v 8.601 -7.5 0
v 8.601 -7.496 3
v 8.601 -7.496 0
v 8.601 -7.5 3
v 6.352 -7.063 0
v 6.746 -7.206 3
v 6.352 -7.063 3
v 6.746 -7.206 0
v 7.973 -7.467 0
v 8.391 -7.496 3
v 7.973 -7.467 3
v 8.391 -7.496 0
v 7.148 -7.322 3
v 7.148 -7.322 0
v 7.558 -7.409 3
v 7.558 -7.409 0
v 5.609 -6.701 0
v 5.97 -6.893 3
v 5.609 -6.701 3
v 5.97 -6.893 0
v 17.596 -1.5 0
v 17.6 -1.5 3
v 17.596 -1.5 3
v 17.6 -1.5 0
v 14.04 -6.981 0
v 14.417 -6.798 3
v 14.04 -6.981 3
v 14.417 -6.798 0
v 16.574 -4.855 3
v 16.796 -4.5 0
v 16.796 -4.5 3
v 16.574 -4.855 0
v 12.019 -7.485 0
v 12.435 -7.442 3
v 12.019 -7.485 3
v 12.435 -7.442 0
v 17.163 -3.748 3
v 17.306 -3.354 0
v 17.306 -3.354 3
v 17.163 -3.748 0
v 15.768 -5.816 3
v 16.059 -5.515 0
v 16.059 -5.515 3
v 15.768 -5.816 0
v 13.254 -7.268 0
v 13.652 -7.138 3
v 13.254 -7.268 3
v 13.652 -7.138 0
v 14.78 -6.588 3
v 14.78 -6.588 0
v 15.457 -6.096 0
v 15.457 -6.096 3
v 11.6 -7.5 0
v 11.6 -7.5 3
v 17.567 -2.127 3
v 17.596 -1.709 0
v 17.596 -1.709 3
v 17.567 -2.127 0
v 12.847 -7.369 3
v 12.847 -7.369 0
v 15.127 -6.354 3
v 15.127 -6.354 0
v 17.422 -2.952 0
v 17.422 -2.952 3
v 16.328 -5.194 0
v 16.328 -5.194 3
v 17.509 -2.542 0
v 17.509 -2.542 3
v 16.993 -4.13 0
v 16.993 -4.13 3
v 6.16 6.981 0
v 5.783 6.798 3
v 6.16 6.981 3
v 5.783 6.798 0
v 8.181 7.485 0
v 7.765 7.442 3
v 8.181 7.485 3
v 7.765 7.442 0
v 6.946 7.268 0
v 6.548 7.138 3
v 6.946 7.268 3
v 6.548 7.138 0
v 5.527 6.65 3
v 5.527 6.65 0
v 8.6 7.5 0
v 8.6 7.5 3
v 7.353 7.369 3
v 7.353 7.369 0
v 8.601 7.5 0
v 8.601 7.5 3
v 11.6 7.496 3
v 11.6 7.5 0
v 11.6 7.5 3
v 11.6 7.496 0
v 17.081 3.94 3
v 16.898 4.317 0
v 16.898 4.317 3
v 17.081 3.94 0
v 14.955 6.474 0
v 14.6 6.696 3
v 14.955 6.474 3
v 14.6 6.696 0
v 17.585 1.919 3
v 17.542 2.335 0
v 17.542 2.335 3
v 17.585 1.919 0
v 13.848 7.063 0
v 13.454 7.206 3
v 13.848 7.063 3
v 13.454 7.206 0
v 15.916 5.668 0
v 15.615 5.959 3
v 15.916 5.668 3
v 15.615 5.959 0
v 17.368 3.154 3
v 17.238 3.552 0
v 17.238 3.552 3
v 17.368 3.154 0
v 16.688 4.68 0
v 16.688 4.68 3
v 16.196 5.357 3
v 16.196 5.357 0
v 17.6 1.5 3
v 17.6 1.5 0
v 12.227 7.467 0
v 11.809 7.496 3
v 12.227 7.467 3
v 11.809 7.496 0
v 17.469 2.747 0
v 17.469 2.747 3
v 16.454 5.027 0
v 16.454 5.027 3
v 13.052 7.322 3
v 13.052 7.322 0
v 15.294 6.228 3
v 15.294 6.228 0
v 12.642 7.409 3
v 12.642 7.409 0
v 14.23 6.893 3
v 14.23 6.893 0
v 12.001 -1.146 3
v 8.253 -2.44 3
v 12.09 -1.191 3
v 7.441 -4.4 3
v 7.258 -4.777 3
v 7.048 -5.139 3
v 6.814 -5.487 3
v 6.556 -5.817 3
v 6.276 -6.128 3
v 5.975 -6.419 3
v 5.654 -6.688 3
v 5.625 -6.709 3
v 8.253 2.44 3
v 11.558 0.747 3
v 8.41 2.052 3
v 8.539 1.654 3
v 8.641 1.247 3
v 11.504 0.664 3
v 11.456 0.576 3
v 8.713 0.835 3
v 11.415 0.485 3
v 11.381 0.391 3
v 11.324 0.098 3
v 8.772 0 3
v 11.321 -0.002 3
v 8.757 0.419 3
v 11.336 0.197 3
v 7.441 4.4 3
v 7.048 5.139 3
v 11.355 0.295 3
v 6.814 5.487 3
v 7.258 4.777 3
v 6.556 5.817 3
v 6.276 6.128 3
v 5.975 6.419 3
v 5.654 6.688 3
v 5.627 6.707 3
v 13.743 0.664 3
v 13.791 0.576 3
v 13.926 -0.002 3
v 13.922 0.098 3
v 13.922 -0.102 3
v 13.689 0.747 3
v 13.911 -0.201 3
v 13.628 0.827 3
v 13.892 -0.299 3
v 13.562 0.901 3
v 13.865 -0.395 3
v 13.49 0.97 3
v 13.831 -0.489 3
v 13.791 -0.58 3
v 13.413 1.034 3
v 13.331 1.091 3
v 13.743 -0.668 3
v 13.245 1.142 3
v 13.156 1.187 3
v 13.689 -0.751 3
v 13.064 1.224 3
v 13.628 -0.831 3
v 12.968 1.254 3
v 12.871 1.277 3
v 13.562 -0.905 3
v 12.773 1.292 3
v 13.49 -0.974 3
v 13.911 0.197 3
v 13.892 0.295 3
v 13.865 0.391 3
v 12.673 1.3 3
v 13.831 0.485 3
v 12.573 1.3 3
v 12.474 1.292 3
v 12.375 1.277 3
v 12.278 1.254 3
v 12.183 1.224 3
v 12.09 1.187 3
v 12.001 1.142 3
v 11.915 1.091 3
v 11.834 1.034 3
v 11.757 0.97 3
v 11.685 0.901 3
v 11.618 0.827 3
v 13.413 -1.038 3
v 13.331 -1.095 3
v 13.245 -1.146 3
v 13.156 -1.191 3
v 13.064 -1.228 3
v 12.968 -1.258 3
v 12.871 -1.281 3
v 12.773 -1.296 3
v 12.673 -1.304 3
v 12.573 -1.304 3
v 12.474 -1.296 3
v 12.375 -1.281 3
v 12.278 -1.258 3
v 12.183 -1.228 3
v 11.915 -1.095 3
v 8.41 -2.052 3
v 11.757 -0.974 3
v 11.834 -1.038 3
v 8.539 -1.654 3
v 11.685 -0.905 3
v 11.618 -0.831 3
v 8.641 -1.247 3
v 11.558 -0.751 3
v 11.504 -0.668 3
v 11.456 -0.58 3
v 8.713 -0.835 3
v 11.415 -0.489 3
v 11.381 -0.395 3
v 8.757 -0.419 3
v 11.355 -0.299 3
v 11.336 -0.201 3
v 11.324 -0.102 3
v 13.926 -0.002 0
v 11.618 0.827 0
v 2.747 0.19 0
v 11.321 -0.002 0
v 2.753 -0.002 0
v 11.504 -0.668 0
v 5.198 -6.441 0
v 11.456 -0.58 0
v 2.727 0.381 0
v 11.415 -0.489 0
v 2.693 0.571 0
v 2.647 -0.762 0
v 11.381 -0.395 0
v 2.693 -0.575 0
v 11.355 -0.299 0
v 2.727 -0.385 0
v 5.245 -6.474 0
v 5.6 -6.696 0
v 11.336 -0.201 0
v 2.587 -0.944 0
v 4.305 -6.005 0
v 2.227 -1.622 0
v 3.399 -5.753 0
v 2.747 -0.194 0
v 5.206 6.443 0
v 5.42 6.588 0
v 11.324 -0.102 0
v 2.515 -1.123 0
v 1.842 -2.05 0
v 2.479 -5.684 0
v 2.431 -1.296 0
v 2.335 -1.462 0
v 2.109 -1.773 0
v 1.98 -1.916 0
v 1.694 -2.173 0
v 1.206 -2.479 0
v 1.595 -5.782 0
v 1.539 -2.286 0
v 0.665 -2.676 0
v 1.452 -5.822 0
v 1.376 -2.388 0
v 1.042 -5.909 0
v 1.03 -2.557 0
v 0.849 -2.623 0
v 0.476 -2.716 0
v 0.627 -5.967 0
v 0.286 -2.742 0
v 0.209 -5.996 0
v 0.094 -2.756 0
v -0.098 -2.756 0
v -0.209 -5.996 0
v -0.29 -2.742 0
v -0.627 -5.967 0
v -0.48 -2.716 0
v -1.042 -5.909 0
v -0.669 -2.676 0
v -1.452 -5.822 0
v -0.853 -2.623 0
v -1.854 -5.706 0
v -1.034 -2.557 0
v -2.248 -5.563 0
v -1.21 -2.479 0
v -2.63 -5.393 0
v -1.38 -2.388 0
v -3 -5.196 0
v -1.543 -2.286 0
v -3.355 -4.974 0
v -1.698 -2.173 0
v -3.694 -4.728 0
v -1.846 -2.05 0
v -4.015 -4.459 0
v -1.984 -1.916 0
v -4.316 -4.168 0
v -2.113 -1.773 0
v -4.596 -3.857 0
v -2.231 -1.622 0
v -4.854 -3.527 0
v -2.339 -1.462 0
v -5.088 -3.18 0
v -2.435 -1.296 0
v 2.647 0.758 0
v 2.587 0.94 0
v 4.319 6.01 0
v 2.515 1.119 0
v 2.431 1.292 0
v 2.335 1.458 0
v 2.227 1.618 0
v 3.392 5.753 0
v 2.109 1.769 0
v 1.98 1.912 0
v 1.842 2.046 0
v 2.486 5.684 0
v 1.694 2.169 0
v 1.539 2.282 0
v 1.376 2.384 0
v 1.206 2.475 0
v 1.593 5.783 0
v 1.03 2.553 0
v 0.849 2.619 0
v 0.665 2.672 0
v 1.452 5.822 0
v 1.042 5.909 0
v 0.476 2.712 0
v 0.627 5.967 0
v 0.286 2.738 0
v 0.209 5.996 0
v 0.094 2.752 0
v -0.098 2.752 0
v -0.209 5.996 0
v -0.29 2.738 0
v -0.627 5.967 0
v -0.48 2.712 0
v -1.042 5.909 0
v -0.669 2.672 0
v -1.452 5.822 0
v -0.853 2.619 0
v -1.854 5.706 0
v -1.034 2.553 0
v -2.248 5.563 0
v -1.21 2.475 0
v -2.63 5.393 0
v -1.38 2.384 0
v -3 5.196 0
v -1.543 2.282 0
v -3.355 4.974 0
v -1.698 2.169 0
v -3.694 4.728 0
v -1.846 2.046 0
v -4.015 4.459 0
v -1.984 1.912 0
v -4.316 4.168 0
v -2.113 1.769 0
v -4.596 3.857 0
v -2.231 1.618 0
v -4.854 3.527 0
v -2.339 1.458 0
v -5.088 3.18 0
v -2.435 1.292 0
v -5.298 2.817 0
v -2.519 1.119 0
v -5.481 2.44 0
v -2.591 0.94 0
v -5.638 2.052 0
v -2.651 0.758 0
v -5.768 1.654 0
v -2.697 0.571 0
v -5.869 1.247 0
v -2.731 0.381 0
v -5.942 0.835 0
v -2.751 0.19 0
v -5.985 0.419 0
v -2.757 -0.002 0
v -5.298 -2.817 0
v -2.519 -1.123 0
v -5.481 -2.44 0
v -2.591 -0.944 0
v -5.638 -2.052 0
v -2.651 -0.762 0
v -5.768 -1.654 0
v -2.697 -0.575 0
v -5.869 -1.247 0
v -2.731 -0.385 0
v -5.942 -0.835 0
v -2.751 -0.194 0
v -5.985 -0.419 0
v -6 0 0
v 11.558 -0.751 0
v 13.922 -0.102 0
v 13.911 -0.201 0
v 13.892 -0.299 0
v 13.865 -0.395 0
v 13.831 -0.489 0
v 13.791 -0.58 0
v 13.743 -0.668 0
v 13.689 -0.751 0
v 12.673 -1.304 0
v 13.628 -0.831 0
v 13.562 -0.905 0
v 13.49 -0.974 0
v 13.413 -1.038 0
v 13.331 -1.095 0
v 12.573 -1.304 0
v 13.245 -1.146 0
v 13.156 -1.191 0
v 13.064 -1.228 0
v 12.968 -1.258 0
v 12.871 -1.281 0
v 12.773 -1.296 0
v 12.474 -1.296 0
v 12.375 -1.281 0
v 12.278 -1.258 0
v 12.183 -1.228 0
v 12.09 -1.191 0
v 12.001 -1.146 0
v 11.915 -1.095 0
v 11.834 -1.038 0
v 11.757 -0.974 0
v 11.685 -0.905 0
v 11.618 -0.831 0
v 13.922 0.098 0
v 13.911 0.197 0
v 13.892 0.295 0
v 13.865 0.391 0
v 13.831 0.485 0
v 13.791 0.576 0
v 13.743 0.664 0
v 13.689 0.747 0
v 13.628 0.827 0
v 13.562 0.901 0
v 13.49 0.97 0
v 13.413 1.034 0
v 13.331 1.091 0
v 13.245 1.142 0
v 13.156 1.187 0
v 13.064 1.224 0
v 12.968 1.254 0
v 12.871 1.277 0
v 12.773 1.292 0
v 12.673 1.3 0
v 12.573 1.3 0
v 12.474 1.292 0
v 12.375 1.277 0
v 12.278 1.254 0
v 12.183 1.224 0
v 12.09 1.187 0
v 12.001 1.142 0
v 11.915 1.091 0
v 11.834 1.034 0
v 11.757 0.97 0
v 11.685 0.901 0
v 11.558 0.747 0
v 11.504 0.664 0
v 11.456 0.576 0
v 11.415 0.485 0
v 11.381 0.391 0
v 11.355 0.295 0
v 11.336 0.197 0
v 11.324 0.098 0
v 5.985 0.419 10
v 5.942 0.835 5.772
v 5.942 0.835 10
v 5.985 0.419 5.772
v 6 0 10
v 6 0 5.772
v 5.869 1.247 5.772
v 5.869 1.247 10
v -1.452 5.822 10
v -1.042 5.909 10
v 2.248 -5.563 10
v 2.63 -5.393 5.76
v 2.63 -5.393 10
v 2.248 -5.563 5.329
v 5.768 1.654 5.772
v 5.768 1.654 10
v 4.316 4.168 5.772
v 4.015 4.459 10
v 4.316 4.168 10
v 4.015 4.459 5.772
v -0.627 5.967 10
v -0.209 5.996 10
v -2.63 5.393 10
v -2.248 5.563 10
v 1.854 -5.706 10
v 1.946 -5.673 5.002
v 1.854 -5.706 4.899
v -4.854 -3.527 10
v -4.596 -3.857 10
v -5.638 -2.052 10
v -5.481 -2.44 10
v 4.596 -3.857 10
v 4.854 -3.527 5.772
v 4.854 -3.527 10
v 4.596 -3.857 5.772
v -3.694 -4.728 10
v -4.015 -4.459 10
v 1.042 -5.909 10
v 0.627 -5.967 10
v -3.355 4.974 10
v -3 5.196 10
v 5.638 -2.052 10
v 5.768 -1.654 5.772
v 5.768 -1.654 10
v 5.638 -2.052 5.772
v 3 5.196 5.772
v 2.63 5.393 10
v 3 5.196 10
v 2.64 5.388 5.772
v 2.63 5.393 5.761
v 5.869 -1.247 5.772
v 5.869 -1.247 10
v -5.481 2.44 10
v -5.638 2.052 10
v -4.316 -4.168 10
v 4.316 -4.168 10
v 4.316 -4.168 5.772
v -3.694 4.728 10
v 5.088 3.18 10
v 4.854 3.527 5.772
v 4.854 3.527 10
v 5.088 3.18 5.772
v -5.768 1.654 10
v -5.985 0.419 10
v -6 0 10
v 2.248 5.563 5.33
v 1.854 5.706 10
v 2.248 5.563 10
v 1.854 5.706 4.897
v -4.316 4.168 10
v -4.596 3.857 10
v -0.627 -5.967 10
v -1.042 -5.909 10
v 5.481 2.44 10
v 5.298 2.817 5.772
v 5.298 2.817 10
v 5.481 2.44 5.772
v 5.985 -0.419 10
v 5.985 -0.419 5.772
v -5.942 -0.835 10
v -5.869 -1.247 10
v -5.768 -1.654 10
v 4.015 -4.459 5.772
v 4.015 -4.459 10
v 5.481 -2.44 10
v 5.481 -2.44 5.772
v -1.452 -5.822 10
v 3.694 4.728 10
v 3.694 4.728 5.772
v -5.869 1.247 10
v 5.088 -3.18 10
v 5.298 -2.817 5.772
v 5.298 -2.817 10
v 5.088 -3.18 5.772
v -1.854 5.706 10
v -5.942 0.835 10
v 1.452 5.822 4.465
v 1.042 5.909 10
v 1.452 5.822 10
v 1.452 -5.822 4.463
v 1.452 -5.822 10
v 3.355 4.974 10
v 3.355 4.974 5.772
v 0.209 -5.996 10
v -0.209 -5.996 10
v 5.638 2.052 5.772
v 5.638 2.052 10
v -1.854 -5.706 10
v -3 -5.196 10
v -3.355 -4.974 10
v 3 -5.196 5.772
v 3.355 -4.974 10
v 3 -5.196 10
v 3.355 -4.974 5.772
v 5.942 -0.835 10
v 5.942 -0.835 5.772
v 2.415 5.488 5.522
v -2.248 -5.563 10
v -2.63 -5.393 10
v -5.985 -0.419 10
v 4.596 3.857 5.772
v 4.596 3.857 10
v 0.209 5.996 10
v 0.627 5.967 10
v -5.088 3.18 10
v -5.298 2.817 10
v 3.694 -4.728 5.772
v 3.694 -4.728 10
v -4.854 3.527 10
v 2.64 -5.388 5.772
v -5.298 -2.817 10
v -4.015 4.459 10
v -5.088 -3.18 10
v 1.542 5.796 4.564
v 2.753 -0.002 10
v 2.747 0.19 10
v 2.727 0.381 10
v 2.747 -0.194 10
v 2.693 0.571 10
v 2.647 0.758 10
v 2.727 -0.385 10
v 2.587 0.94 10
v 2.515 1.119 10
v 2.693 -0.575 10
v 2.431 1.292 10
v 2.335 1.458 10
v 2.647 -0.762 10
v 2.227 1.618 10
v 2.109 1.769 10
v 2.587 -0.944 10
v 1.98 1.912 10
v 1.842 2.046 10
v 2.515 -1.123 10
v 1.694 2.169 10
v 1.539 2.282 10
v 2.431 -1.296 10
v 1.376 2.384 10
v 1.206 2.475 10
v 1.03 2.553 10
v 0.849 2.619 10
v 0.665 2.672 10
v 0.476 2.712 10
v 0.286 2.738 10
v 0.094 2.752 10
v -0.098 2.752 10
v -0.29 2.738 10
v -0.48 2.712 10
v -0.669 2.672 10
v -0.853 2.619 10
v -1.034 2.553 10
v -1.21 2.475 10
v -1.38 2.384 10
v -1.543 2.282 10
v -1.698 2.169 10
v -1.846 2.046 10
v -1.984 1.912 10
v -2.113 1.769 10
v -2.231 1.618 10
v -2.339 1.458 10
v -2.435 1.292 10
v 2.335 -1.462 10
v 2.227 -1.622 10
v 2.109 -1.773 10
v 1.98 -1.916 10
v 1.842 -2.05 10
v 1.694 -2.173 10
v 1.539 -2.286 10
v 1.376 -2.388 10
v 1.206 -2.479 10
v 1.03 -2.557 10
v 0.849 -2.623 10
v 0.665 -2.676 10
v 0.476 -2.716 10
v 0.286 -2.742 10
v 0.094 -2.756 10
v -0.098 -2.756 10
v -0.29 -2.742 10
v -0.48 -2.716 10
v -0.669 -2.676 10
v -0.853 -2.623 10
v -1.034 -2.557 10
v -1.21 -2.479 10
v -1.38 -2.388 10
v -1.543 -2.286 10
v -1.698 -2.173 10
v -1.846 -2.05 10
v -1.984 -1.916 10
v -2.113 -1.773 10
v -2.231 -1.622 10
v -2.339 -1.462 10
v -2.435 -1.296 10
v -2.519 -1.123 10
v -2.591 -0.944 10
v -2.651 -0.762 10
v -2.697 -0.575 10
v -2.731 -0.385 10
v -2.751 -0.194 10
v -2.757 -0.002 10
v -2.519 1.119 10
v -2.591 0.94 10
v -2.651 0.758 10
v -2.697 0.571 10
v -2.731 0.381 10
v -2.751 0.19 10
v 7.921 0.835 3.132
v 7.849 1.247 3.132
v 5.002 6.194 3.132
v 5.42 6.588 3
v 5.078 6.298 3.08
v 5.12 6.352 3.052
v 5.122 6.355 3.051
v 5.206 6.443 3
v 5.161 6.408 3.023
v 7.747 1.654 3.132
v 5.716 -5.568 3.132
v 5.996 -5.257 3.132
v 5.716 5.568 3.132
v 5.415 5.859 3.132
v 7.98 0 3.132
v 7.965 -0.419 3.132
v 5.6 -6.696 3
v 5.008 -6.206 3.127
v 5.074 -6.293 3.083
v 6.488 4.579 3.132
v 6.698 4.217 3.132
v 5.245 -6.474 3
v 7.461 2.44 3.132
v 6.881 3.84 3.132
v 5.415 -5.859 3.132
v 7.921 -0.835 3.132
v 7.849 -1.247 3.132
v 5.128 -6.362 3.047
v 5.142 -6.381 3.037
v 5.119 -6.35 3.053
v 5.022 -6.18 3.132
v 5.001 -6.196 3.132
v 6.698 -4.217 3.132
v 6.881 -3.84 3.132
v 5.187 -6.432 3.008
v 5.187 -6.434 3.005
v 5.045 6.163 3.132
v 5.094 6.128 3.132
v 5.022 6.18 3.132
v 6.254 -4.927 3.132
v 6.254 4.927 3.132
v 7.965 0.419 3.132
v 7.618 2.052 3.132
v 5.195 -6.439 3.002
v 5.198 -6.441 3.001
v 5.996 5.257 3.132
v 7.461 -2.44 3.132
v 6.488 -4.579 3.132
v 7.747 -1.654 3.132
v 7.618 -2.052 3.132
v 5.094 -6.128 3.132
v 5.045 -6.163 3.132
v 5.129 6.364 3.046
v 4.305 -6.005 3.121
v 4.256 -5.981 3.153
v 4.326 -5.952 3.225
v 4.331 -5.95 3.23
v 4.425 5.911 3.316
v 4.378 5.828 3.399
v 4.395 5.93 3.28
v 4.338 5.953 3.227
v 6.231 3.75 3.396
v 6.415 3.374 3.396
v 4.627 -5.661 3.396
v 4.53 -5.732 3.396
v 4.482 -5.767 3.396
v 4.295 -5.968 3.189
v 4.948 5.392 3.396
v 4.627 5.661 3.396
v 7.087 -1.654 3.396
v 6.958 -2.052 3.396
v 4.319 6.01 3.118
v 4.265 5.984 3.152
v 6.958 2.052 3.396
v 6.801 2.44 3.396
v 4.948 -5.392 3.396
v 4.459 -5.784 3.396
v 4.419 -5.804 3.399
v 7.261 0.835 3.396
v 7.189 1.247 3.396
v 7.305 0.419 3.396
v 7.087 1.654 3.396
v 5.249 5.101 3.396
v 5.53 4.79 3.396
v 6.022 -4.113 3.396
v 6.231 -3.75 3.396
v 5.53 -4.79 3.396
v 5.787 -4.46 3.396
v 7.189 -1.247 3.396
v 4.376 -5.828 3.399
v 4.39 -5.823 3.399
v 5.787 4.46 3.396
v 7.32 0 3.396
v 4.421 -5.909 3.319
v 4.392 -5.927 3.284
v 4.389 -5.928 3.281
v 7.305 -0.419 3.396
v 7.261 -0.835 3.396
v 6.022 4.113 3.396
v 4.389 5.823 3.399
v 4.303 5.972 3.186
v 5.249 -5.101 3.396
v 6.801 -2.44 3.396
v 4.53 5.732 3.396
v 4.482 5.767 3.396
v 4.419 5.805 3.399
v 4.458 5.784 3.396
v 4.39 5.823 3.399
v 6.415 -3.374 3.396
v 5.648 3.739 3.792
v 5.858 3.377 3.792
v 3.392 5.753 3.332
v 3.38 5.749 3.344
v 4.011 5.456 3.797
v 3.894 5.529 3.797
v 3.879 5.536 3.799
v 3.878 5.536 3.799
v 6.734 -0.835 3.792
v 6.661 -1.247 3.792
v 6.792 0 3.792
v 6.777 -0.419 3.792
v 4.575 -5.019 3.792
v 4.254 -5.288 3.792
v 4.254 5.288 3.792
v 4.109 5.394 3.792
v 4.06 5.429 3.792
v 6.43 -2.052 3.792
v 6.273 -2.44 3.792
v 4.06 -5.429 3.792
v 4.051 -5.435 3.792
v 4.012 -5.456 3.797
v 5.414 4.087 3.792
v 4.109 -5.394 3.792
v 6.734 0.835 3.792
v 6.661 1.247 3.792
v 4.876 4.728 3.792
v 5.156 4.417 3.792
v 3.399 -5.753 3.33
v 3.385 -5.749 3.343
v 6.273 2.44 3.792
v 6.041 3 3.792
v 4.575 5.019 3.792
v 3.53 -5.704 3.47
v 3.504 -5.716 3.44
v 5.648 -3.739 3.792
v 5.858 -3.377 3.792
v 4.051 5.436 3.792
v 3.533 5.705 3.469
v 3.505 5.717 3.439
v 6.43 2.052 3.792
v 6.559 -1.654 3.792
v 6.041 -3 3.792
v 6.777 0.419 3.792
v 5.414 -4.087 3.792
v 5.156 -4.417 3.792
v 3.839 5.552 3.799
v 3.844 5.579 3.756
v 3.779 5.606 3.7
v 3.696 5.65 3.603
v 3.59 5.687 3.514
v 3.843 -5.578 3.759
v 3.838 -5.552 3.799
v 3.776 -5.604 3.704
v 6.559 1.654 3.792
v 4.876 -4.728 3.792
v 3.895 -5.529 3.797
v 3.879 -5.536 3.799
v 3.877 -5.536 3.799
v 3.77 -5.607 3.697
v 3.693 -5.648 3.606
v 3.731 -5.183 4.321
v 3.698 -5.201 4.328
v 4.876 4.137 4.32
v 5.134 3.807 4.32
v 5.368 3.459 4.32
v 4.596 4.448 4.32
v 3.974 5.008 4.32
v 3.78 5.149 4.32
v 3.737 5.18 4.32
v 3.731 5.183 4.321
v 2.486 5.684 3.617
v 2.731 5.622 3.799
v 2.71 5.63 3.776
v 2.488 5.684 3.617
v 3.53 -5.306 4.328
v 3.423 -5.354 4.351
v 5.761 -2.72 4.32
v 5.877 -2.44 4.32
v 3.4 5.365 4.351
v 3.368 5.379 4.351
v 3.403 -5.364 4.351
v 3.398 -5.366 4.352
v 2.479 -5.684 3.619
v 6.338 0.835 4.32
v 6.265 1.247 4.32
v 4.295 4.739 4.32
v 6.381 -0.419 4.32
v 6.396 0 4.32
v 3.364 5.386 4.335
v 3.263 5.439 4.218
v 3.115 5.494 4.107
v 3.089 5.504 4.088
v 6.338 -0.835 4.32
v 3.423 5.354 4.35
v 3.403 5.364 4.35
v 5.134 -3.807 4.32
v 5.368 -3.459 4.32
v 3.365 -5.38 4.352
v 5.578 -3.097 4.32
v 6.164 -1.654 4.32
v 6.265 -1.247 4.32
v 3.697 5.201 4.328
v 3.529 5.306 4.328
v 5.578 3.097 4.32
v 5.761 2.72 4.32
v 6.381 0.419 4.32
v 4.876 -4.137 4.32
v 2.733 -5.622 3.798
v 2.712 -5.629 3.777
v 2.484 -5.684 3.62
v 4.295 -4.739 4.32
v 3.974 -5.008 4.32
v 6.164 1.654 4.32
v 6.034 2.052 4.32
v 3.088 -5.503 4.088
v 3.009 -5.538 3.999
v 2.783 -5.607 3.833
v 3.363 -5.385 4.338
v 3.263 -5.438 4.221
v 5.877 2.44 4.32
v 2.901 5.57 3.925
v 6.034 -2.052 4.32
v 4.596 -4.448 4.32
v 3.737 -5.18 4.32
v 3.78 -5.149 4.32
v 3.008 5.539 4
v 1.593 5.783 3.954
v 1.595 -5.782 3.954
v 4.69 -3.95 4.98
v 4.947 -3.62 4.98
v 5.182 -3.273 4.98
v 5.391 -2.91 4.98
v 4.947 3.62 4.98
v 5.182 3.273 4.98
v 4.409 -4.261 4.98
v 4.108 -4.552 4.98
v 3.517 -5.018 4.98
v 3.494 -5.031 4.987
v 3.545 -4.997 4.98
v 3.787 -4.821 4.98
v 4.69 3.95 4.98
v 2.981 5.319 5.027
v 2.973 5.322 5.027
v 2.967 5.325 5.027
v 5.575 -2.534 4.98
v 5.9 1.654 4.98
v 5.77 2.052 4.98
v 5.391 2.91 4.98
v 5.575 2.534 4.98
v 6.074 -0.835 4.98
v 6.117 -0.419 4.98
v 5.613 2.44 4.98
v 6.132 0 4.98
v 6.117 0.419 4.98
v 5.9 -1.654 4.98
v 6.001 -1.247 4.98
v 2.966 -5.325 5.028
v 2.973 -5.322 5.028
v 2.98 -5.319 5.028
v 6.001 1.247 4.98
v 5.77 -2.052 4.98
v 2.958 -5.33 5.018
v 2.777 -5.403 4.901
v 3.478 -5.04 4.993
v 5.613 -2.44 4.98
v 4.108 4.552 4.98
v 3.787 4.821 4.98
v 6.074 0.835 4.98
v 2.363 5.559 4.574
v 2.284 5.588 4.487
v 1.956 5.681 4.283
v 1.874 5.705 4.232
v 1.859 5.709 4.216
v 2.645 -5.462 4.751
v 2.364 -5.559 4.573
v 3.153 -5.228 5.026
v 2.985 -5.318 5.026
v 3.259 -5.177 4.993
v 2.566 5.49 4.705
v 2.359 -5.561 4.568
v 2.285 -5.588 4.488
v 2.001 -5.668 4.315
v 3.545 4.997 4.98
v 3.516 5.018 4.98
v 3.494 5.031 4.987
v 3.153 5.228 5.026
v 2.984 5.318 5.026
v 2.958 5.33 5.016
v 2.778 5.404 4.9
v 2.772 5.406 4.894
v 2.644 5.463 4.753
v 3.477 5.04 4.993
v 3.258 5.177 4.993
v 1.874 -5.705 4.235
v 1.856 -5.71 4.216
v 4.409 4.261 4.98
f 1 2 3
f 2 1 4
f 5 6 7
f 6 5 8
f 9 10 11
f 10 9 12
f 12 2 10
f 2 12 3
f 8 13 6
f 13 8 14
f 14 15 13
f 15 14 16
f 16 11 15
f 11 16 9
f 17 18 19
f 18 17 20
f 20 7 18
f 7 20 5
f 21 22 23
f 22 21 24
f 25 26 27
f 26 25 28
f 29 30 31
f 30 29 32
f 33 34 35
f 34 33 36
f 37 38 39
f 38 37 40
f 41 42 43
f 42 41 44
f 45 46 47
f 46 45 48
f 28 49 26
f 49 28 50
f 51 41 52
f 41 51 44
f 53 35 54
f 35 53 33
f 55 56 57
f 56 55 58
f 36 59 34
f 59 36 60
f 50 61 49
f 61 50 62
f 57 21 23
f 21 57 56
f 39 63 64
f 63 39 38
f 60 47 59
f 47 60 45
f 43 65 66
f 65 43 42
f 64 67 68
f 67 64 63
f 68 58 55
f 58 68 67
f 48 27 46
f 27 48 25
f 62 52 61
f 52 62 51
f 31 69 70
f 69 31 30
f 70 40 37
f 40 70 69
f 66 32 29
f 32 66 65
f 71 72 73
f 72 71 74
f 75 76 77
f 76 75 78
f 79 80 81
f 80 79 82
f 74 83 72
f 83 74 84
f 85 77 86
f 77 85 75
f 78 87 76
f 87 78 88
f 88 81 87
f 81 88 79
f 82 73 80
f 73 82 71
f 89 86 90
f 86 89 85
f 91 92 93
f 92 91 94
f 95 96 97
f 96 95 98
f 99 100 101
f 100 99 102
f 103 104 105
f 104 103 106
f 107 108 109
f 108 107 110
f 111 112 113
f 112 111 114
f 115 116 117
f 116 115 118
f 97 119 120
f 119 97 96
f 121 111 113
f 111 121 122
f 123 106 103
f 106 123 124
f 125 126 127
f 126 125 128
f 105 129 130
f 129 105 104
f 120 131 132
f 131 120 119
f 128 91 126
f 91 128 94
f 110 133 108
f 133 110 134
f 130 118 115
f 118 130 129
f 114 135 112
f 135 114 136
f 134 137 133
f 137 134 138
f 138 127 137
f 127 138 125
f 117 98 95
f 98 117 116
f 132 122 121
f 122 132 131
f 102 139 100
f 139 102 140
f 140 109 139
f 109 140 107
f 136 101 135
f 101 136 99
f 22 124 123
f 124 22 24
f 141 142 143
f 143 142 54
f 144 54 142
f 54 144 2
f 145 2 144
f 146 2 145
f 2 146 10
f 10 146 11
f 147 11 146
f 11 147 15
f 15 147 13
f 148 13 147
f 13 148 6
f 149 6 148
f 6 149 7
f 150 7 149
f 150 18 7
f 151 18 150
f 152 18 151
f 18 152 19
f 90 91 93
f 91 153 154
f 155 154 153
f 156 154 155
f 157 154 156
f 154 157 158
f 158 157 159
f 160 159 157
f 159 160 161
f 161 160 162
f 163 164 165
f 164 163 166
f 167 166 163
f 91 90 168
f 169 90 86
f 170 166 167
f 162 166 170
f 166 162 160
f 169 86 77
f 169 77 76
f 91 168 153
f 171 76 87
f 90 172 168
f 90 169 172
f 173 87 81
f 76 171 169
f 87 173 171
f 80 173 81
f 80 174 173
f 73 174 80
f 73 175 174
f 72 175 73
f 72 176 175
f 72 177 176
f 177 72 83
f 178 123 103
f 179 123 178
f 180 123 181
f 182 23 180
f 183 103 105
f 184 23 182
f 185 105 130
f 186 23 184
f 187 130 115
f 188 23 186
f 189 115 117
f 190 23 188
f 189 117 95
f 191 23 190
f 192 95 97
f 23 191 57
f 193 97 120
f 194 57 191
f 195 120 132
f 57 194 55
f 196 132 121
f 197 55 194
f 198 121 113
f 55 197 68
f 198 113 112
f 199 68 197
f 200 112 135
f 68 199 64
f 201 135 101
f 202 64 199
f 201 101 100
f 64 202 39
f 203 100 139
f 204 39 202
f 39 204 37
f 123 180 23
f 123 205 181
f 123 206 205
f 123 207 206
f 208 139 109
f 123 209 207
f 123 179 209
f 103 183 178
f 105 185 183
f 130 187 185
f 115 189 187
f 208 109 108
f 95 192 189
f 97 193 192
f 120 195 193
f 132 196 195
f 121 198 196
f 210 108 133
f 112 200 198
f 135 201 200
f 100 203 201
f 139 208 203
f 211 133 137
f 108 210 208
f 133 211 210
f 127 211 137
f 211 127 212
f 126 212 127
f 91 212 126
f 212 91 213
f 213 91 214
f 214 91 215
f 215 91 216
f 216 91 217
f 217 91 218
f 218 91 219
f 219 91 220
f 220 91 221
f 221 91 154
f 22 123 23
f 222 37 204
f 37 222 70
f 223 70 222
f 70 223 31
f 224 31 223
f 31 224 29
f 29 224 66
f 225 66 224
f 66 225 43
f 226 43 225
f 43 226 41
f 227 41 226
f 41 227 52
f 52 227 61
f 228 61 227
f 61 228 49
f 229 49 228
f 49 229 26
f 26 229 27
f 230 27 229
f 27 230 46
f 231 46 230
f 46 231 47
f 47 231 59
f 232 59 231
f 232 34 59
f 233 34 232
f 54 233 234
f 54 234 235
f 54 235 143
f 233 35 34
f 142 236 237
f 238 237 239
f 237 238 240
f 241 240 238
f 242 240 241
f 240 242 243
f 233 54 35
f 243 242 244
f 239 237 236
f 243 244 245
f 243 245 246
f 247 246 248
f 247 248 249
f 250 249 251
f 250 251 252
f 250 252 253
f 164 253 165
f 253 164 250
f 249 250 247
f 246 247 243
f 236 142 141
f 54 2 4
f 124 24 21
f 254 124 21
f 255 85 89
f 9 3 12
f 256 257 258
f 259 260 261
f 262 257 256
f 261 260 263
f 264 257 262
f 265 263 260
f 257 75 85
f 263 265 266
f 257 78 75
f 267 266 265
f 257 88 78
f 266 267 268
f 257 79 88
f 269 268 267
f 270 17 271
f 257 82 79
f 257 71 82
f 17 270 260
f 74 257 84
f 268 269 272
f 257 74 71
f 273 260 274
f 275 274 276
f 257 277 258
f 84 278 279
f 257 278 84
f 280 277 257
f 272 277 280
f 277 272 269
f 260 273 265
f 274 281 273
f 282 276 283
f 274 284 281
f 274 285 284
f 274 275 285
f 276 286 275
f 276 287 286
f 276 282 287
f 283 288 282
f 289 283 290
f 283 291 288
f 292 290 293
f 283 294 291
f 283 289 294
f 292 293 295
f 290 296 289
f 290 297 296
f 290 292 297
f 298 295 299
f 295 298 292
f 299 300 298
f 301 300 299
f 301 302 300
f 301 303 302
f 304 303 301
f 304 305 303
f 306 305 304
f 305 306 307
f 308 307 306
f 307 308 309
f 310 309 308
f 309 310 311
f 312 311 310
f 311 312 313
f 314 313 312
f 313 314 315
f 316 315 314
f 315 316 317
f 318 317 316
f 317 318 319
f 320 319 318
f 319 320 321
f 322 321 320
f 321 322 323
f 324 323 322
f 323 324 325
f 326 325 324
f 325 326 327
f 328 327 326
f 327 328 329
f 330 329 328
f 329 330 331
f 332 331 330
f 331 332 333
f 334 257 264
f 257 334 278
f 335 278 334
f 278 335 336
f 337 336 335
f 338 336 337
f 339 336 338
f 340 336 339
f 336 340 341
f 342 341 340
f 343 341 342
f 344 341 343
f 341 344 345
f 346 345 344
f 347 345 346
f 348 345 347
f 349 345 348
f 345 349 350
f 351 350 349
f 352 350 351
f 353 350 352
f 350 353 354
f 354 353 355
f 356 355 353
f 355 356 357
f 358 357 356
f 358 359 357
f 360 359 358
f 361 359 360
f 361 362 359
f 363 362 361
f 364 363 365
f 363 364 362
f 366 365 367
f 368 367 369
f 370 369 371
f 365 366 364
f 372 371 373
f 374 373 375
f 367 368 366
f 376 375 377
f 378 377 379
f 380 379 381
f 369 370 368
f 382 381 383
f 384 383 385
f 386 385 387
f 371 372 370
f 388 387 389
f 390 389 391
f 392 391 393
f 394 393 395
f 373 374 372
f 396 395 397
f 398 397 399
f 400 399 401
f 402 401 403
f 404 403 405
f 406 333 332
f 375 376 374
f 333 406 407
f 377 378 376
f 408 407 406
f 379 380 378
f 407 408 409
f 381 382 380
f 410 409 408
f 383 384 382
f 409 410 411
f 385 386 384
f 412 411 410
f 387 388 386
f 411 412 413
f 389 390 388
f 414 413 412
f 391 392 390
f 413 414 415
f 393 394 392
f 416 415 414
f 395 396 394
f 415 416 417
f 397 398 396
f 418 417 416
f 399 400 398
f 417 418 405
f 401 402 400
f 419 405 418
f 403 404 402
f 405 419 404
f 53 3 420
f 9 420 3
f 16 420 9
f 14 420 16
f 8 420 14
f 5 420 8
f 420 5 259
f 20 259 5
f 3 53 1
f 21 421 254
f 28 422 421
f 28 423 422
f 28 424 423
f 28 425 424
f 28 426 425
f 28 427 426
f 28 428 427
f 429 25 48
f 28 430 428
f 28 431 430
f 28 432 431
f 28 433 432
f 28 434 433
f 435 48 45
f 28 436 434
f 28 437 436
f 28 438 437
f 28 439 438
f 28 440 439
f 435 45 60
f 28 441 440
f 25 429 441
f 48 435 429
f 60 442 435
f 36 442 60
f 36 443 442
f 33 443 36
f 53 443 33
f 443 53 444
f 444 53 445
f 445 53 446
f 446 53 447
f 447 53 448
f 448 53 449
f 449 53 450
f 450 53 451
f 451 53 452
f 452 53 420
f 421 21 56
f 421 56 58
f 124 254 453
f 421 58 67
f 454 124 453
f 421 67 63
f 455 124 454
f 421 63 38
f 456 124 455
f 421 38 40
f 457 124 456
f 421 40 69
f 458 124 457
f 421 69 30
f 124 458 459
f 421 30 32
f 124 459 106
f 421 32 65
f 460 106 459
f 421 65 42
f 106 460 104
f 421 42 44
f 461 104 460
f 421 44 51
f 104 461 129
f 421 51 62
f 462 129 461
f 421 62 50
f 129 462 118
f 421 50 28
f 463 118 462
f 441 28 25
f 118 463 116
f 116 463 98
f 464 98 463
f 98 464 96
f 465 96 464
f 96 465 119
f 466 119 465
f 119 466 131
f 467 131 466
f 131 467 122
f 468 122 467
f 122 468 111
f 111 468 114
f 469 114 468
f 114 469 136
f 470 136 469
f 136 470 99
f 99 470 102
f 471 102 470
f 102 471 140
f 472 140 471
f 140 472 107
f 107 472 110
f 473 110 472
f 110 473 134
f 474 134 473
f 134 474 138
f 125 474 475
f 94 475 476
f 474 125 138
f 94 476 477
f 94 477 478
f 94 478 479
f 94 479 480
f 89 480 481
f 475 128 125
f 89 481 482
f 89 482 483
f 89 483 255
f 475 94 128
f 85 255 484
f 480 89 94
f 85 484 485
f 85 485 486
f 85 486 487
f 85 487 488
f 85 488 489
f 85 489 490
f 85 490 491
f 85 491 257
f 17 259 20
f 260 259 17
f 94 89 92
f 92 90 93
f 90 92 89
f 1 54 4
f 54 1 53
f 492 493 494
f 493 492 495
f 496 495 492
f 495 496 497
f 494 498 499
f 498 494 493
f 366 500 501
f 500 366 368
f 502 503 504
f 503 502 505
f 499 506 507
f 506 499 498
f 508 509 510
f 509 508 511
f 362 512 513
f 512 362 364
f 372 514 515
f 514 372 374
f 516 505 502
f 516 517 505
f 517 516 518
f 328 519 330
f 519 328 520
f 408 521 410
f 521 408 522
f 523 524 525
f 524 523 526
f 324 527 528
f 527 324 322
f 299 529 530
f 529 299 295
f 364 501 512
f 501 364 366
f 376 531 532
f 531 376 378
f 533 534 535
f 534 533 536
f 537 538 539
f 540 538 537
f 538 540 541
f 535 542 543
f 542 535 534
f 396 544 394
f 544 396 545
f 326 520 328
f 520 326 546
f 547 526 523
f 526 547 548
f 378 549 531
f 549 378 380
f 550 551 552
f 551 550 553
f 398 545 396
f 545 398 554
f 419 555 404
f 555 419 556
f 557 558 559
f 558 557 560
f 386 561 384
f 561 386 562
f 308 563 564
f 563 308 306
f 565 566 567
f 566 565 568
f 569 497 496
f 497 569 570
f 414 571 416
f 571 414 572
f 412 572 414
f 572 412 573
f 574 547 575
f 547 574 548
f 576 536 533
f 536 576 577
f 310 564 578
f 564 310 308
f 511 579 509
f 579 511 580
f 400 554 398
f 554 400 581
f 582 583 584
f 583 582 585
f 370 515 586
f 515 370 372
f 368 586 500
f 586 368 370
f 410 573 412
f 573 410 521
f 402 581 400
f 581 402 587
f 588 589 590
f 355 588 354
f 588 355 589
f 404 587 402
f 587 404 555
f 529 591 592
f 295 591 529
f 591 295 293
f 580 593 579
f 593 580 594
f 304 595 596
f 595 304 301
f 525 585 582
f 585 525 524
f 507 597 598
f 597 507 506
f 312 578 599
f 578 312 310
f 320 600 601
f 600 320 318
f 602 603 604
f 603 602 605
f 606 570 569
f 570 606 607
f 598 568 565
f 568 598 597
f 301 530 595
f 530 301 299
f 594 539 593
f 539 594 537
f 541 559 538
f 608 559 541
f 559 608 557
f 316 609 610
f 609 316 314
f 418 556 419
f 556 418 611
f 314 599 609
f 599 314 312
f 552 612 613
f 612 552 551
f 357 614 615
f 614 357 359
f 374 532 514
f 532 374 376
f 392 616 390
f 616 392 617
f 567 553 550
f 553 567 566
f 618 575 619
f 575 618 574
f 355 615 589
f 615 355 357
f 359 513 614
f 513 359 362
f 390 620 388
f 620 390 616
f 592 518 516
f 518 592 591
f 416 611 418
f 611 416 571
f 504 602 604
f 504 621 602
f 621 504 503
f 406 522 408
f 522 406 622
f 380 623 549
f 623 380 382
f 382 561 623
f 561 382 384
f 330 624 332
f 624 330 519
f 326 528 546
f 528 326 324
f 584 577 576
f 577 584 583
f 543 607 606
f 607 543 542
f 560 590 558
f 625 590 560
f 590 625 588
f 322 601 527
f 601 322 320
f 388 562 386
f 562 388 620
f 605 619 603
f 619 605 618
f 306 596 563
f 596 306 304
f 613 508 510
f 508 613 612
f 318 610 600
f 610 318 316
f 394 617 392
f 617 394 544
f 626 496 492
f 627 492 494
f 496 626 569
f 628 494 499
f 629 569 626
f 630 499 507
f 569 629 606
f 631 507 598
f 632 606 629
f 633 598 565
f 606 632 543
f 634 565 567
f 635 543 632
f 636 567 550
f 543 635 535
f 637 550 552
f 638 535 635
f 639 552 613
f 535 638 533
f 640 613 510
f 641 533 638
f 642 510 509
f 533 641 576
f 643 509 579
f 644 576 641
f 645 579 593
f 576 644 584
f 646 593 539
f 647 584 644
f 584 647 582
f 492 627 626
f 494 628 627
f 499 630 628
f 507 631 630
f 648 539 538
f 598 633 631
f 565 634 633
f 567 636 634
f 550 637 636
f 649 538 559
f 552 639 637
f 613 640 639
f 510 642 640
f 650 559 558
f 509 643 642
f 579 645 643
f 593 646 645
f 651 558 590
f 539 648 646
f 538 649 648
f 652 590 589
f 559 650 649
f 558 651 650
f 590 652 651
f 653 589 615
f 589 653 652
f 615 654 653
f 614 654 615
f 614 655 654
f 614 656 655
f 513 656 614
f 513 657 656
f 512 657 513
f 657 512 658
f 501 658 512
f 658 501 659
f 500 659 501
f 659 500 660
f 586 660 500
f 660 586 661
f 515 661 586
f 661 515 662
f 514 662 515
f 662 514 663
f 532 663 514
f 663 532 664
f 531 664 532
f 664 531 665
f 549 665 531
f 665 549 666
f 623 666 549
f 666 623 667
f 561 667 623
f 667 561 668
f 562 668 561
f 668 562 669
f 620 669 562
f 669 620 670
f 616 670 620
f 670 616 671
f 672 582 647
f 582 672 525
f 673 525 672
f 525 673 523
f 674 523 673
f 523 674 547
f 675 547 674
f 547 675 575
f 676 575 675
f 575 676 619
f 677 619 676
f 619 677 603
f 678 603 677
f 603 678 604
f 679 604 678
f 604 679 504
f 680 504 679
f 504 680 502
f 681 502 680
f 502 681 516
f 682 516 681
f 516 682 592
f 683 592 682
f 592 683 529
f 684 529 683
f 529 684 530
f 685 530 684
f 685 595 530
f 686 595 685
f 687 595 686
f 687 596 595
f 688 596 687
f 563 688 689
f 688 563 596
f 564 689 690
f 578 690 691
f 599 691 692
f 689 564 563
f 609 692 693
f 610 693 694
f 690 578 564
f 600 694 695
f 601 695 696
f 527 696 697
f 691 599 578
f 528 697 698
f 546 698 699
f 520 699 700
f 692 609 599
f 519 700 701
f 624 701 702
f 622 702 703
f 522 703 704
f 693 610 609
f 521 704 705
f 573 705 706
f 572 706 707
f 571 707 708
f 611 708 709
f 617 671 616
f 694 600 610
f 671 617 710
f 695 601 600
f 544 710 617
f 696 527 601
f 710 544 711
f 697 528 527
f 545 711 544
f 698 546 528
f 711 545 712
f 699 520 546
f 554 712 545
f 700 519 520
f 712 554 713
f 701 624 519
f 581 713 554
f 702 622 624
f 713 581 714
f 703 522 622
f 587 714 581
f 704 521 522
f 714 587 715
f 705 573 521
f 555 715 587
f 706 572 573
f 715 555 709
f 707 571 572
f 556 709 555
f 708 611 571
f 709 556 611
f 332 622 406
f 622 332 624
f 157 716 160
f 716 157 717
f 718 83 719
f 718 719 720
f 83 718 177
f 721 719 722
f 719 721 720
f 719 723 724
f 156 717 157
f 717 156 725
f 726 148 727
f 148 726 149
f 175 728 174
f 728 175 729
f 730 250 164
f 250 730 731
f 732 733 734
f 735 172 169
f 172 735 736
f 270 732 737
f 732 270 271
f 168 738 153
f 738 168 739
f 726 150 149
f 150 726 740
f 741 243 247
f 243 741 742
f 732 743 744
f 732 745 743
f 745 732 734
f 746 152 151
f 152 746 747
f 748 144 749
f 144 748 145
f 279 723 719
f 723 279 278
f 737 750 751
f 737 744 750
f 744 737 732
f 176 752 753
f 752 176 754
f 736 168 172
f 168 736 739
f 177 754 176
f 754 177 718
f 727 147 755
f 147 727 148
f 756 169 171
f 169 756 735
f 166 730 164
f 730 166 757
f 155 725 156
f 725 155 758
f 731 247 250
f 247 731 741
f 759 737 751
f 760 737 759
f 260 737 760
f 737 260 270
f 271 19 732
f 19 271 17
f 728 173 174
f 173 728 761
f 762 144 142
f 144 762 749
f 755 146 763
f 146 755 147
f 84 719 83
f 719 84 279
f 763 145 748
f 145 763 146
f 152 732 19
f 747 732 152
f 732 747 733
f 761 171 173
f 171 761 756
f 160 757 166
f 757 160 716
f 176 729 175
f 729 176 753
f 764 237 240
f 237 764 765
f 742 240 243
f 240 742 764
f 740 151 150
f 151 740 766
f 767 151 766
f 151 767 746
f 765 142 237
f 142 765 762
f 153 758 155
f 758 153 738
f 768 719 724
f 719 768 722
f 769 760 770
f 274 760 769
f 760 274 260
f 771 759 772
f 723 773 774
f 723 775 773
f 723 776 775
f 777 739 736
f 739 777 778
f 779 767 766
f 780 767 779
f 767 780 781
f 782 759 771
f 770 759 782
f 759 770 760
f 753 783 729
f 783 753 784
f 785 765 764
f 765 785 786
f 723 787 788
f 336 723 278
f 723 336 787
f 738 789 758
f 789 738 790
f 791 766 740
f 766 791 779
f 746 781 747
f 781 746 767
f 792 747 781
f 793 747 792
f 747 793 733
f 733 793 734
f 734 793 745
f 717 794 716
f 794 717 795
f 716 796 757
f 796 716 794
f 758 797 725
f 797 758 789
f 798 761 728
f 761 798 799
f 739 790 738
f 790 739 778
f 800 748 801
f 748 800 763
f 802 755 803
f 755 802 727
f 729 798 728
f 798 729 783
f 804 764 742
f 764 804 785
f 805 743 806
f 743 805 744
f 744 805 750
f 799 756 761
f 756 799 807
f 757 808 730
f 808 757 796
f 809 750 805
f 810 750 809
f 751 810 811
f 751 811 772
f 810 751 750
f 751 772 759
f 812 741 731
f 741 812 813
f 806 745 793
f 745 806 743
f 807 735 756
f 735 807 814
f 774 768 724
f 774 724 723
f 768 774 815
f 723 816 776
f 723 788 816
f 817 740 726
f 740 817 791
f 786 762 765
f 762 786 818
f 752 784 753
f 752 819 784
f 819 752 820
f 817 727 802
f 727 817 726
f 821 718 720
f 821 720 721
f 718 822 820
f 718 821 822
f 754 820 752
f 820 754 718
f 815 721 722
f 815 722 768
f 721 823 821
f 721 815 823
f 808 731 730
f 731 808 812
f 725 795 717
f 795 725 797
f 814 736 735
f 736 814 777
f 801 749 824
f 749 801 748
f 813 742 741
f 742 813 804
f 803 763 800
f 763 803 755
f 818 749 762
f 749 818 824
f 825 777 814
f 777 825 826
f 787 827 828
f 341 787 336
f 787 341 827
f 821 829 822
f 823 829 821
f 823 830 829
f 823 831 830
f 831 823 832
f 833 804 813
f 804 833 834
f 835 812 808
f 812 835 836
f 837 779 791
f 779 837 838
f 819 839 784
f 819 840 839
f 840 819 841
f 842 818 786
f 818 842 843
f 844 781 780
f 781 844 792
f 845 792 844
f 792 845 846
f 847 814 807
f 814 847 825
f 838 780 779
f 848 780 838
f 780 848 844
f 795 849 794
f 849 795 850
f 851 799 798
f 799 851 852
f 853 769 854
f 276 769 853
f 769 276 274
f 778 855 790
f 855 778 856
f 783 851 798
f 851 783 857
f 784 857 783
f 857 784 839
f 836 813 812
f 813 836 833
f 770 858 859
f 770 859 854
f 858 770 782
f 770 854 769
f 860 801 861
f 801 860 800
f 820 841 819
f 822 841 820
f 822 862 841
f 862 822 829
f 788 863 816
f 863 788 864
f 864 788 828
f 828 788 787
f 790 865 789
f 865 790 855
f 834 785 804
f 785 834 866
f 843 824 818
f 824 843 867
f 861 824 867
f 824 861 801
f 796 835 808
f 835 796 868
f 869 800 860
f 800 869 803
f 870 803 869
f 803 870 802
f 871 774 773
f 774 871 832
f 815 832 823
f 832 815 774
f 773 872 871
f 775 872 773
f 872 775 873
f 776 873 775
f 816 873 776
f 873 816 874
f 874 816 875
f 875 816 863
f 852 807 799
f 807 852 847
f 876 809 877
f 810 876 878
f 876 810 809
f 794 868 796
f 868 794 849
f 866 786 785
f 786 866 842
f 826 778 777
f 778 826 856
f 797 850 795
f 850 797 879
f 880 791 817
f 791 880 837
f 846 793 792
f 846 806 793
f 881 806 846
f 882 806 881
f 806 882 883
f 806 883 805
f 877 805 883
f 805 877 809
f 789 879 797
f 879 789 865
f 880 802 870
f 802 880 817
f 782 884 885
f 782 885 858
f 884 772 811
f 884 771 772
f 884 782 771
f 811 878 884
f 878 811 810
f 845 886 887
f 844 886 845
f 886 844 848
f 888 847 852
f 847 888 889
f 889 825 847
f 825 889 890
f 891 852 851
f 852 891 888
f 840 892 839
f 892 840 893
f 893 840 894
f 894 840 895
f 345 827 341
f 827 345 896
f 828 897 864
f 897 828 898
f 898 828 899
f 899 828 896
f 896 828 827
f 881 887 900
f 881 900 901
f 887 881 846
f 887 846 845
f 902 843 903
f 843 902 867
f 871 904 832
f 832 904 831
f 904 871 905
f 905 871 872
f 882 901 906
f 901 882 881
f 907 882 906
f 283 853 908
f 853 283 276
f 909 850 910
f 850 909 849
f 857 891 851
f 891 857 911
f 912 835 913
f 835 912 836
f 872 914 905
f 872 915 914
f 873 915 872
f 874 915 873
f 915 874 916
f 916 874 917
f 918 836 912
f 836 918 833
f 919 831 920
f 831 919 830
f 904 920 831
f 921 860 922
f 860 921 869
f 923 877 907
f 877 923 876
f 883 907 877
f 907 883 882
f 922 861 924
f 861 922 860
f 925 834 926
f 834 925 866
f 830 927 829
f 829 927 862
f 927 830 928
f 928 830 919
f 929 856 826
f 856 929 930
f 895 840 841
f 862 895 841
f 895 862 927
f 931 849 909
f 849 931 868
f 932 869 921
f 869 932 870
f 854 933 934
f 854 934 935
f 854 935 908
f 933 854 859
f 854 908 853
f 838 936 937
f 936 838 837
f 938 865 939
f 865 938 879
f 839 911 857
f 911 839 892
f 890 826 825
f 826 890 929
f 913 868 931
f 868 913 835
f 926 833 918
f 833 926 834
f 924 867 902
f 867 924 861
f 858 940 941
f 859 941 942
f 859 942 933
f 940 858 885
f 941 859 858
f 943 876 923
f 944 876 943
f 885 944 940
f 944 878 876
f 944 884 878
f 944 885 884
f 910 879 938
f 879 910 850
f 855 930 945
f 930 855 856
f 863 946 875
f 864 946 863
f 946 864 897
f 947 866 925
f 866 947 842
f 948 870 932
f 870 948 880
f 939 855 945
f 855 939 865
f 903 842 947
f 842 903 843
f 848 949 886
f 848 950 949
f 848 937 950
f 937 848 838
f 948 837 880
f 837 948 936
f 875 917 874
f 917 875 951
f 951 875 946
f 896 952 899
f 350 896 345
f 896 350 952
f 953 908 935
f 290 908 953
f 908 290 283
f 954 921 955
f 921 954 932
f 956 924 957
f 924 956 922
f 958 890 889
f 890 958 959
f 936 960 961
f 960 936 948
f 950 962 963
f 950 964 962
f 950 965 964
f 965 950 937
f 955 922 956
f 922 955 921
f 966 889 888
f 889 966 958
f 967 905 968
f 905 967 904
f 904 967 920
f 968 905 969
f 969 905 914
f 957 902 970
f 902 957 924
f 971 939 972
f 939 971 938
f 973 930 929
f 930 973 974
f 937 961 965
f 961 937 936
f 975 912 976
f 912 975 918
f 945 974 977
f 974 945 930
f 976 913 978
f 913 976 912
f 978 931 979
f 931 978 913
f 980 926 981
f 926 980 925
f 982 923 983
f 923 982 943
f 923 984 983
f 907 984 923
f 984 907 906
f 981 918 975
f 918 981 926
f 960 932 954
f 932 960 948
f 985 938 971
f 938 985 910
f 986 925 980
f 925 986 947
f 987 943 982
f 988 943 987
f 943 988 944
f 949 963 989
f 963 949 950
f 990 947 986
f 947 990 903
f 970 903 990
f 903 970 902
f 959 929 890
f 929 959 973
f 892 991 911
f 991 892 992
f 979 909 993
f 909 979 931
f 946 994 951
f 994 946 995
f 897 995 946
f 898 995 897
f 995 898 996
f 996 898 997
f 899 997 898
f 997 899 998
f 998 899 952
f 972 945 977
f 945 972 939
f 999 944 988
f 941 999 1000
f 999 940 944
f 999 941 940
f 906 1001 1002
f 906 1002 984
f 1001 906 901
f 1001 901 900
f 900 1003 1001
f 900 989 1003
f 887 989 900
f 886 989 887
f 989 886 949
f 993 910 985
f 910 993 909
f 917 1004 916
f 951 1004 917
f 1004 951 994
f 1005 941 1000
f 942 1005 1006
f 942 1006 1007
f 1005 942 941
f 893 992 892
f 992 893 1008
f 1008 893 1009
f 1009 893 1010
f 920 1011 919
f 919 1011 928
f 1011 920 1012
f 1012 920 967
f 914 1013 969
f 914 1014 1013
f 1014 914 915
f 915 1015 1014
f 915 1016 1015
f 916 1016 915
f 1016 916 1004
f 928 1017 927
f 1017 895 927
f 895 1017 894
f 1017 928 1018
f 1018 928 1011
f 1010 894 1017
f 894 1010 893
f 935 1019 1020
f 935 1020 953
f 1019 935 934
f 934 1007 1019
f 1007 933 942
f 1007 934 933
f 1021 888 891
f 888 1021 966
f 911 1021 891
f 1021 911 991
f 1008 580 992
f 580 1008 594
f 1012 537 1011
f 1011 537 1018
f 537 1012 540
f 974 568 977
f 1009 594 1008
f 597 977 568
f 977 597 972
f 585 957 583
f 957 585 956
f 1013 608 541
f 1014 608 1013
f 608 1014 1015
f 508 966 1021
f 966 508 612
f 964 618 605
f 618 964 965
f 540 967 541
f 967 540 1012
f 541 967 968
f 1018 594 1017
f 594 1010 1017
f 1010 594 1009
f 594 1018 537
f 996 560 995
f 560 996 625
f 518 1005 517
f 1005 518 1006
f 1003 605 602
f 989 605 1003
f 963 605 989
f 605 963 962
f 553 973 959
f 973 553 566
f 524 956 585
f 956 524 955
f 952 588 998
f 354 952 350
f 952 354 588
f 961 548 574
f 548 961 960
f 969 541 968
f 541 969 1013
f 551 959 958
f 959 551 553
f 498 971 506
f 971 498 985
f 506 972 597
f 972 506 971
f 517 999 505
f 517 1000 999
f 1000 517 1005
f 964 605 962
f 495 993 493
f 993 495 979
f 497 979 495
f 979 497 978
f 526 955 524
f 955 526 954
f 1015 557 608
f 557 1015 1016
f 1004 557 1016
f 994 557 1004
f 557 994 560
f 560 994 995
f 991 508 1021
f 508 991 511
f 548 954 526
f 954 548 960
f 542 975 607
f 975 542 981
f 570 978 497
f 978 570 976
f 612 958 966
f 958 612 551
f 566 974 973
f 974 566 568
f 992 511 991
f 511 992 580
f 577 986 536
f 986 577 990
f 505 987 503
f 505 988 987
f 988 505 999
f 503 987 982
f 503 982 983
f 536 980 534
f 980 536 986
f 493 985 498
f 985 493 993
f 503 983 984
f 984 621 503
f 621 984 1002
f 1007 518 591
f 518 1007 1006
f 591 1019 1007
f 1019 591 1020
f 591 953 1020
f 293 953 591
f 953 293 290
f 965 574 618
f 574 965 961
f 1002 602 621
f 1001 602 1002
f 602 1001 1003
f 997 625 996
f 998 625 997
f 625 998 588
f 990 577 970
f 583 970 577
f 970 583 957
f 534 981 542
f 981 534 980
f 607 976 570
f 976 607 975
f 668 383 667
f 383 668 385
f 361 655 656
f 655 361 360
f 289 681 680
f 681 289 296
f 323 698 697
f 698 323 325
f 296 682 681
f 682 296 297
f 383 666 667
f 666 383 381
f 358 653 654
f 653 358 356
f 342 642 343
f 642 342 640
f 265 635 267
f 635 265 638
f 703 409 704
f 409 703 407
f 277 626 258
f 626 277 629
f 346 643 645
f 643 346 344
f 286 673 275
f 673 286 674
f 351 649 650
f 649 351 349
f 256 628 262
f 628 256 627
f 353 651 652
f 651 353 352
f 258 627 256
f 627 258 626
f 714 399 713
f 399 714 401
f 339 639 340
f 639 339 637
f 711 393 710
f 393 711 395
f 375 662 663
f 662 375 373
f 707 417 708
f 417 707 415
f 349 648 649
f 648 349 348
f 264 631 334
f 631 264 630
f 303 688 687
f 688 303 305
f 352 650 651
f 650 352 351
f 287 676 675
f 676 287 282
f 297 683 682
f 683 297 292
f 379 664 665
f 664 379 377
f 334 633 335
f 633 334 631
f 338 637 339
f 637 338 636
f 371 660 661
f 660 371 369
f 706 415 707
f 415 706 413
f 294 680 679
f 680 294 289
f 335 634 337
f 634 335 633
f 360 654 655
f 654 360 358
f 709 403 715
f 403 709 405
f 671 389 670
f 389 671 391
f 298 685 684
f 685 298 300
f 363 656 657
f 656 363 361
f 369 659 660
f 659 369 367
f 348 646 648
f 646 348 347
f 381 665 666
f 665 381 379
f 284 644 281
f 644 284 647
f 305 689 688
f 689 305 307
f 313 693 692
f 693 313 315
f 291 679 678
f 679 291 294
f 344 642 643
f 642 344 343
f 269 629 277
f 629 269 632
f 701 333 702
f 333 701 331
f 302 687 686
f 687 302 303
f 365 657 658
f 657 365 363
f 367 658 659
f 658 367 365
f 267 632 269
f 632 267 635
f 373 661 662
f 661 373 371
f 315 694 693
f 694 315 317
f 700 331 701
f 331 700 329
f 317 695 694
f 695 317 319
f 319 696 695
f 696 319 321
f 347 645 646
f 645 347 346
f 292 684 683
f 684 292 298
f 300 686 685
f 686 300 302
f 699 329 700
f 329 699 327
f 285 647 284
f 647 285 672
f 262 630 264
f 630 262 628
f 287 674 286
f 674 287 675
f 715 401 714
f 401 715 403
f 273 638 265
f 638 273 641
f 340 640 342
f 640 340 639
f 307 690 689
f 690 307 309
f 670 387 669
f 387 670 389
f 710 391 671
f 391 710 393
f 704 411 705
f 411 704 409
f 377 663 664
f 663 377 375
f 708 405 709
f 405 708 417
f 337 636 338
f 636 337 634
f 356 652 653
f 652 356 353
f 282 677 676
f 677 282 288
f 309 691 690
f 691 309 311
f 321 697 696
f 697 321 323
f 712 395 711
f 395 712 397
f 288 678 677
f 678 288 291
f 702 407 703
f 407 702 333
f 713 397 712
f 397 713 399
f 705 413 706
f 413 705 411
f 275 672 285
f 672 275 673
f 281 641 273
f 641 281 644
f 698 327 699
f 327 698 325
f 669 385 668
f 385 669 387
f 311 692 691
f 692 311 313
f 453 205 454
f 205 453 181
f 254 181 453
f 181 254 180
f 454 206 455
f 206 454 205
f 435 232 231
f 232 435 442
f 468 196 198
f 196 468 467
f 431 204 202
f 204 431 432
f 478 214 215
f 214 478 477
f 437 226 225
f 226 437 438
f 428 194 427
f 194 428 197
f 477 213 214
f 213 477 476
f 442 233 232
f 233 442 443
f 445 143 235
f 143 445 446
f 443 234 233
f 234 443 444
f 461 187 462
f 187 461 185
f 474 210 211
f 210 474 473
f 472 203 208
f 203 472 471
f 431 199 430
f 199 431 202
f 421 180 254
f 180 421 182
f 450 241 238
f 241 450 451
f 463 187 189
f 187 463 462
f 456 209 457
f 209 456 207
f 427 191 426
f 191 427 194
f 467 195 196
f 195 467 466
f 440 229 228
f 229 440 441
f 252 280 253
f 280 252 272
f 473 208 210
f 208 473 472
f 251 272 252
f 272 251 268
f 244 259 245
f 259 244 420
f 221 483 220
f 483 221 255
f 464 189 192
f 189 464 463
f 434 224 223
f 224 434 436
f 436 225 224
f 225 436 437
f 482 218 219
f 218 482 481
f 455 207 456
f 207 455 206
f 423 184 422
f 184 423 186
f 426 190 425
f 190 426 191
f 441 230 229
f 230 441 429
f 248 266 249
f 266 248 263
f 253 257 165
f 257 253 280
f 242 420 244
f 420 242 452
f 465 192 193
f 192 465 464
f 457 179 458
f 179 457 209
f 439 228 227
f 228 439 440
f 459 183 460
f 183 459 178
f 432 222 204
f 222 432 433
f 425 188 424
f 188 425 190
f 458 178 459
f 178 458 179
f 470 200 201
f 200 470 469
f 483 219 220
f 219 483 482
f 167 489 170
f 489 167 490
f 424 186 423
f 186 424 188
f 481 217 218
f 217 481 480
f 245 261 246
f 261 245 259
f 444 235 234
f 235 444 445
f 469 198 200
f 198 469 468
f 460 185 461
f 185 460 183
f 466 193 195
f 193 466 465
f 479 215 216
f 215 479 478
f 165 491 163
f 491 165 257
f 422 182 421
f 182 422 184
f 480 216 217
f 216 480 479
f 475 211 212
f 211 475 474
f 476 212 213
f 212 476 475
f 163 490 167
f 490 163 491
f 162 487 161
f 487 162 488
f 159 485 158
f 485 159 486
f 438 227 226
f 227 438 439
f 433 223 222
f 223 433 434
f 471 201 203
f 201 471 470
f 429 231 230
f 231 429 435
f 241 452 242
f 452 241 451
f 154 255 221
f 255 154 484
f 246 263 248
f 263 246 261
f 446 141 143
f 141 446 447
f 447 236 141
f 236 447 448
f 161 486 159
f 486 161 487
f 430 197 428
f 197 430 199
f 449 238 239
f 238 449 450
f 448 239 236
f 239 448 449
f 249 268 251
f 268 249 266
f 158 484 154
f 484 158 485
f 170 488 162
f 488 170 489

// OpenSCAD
// file: defs.scad
$fs = 0.1; // min angle for curved shapes
$fa = 4; // min segment/fragment size

RAD = 180 / PI;
DEG = 1;

epsilon = 0.002; // fudge to fix floating point rounding issues
tolerance = 0.2;  // 3D printing tolerance to fit around objects

module diffscale(n=1) {
     for (i = [0 : $children-1]) {
         translate([-n*epsilon,-n*epsilon,-n*epsilon]) scale([1+n*epsilon,1+n*epsilon,1+n*epsilon]) children(i);
     }
}

module rounded_rect(size, radius, epsilon=0.001) {
    module fillet(r, h) {
        translate([r/2, r/2, 0]) difference() {
            cube([r + epsilon, r + epsilon, h], center = true);
            translate([r/2, r/2, 0])
                cylinder(r = r, h = h + 1, center = true);
        }
    }
    difference() {
        cube(size);
        translate([0,0,size.z/2]) fillet(radius,size.z+0.001);
        translate([size.x,0,size.z/2]) rotate(PI/2*RAD, [0,0,1]) fillet(radius, size.z+epsilon);
        translate([0,size.y,size.z/2]) rotate(-PI/2*RAD, [0,0,1]) fillet(radius, size.z+epsilon);
        translate([size.x,size.y,size.z/2]) rotate(PI*RAD, [0,0,1]) fillet(radius, size.z+epsilon);
    }
}

rodRadius = 2.5 + 0.10;
wedgeSize = [15,15,3];
drillClearance = 1*wedgeSize.x/3;
lensRadius = 50.2;
lensGripDrillRadius = 51 + drillClearance + 1;
m3TapDia = 2.5 + 0.1;
edgeLensThickness = 3.4; // thickness of lens at edge
lensOverlap = 2;
lensGripHalfHeight = wedgeSize.z;//3.6;

rodDrillRadius = 78;

module fillet(r=1.0,steps=3,include=true) {
  if(include) for (k=[0:$children-1]) {
	children(k);
  }
  for (i=[0:$children-2] ) {
    for(j=[i+1:$children-1] ) {
	fillet_two(r=r,steps=steps) {
	  children(i);
	  children(j);
	  intersection() {
		children(i);
		children(j);
	  }
	}
    }
  }
}

module fillet_two(r=1.0,steps=3) {
  for(step=[1:steps]) {
	hull() {
	  render() intersection() {
		children(0);
		offset_3d(r=r*step/steps) children(2);
	  }
	  render() intersection() {
		children(1);
		offset_3d(r=r*(steps-step+1)/steps) children(2);
	  }
	}
  }
}

module offset_3d(r=1.0) {
  for(k=[0:$children-1]) minkowski() {
	children(k);
	sphere(r=r,$fn=8);
  }
}

module sector(radius, angles, fn = 24) {
    r = radius / cos(180 / fn);
    step = -360 / fn;

    points = concat([[0, 0]],
        [for(a = [angles[0] : step : angles[1] - 360]) 
            [r * cos(a), r * sin(a)]
        ],
        [[r * cos(angles[1]), r * sin(angles[1])]]
    );

    difference() {
        circle(radius, $fn = fn);
        polygon(points);
    }
}

module arc(radius, angles, width = 1, fn = 24) {
    difference() {
        sector(radius + width, angles, fn);
        sector(radius, angles, fn);
    }
} 

//

module rodgrip(rodCutoutRadius, rodGripThickness) {
    difference() {
        fillet(r=3,steps=6) {
            cylinder(r=6,h=rodGripThickness);
            
            translate([rodRadius,-wedgeSize.y/2,0]) {
                rounded_rect(wedgeSize, 6);
            }
        }
        diffscale() {
            cylinder(r=rodCutoutRadius,h=10);
            translate([rodRadius + wedgeSize.x - drillClearance,0,0]) cylinder(r=m3TapDia/2, h=wedgeSize.z);
        }
    }
}
// main file
include <defs.scad>

rodgrip(rodRadius + 0.15 /* tolerance */, 10);
